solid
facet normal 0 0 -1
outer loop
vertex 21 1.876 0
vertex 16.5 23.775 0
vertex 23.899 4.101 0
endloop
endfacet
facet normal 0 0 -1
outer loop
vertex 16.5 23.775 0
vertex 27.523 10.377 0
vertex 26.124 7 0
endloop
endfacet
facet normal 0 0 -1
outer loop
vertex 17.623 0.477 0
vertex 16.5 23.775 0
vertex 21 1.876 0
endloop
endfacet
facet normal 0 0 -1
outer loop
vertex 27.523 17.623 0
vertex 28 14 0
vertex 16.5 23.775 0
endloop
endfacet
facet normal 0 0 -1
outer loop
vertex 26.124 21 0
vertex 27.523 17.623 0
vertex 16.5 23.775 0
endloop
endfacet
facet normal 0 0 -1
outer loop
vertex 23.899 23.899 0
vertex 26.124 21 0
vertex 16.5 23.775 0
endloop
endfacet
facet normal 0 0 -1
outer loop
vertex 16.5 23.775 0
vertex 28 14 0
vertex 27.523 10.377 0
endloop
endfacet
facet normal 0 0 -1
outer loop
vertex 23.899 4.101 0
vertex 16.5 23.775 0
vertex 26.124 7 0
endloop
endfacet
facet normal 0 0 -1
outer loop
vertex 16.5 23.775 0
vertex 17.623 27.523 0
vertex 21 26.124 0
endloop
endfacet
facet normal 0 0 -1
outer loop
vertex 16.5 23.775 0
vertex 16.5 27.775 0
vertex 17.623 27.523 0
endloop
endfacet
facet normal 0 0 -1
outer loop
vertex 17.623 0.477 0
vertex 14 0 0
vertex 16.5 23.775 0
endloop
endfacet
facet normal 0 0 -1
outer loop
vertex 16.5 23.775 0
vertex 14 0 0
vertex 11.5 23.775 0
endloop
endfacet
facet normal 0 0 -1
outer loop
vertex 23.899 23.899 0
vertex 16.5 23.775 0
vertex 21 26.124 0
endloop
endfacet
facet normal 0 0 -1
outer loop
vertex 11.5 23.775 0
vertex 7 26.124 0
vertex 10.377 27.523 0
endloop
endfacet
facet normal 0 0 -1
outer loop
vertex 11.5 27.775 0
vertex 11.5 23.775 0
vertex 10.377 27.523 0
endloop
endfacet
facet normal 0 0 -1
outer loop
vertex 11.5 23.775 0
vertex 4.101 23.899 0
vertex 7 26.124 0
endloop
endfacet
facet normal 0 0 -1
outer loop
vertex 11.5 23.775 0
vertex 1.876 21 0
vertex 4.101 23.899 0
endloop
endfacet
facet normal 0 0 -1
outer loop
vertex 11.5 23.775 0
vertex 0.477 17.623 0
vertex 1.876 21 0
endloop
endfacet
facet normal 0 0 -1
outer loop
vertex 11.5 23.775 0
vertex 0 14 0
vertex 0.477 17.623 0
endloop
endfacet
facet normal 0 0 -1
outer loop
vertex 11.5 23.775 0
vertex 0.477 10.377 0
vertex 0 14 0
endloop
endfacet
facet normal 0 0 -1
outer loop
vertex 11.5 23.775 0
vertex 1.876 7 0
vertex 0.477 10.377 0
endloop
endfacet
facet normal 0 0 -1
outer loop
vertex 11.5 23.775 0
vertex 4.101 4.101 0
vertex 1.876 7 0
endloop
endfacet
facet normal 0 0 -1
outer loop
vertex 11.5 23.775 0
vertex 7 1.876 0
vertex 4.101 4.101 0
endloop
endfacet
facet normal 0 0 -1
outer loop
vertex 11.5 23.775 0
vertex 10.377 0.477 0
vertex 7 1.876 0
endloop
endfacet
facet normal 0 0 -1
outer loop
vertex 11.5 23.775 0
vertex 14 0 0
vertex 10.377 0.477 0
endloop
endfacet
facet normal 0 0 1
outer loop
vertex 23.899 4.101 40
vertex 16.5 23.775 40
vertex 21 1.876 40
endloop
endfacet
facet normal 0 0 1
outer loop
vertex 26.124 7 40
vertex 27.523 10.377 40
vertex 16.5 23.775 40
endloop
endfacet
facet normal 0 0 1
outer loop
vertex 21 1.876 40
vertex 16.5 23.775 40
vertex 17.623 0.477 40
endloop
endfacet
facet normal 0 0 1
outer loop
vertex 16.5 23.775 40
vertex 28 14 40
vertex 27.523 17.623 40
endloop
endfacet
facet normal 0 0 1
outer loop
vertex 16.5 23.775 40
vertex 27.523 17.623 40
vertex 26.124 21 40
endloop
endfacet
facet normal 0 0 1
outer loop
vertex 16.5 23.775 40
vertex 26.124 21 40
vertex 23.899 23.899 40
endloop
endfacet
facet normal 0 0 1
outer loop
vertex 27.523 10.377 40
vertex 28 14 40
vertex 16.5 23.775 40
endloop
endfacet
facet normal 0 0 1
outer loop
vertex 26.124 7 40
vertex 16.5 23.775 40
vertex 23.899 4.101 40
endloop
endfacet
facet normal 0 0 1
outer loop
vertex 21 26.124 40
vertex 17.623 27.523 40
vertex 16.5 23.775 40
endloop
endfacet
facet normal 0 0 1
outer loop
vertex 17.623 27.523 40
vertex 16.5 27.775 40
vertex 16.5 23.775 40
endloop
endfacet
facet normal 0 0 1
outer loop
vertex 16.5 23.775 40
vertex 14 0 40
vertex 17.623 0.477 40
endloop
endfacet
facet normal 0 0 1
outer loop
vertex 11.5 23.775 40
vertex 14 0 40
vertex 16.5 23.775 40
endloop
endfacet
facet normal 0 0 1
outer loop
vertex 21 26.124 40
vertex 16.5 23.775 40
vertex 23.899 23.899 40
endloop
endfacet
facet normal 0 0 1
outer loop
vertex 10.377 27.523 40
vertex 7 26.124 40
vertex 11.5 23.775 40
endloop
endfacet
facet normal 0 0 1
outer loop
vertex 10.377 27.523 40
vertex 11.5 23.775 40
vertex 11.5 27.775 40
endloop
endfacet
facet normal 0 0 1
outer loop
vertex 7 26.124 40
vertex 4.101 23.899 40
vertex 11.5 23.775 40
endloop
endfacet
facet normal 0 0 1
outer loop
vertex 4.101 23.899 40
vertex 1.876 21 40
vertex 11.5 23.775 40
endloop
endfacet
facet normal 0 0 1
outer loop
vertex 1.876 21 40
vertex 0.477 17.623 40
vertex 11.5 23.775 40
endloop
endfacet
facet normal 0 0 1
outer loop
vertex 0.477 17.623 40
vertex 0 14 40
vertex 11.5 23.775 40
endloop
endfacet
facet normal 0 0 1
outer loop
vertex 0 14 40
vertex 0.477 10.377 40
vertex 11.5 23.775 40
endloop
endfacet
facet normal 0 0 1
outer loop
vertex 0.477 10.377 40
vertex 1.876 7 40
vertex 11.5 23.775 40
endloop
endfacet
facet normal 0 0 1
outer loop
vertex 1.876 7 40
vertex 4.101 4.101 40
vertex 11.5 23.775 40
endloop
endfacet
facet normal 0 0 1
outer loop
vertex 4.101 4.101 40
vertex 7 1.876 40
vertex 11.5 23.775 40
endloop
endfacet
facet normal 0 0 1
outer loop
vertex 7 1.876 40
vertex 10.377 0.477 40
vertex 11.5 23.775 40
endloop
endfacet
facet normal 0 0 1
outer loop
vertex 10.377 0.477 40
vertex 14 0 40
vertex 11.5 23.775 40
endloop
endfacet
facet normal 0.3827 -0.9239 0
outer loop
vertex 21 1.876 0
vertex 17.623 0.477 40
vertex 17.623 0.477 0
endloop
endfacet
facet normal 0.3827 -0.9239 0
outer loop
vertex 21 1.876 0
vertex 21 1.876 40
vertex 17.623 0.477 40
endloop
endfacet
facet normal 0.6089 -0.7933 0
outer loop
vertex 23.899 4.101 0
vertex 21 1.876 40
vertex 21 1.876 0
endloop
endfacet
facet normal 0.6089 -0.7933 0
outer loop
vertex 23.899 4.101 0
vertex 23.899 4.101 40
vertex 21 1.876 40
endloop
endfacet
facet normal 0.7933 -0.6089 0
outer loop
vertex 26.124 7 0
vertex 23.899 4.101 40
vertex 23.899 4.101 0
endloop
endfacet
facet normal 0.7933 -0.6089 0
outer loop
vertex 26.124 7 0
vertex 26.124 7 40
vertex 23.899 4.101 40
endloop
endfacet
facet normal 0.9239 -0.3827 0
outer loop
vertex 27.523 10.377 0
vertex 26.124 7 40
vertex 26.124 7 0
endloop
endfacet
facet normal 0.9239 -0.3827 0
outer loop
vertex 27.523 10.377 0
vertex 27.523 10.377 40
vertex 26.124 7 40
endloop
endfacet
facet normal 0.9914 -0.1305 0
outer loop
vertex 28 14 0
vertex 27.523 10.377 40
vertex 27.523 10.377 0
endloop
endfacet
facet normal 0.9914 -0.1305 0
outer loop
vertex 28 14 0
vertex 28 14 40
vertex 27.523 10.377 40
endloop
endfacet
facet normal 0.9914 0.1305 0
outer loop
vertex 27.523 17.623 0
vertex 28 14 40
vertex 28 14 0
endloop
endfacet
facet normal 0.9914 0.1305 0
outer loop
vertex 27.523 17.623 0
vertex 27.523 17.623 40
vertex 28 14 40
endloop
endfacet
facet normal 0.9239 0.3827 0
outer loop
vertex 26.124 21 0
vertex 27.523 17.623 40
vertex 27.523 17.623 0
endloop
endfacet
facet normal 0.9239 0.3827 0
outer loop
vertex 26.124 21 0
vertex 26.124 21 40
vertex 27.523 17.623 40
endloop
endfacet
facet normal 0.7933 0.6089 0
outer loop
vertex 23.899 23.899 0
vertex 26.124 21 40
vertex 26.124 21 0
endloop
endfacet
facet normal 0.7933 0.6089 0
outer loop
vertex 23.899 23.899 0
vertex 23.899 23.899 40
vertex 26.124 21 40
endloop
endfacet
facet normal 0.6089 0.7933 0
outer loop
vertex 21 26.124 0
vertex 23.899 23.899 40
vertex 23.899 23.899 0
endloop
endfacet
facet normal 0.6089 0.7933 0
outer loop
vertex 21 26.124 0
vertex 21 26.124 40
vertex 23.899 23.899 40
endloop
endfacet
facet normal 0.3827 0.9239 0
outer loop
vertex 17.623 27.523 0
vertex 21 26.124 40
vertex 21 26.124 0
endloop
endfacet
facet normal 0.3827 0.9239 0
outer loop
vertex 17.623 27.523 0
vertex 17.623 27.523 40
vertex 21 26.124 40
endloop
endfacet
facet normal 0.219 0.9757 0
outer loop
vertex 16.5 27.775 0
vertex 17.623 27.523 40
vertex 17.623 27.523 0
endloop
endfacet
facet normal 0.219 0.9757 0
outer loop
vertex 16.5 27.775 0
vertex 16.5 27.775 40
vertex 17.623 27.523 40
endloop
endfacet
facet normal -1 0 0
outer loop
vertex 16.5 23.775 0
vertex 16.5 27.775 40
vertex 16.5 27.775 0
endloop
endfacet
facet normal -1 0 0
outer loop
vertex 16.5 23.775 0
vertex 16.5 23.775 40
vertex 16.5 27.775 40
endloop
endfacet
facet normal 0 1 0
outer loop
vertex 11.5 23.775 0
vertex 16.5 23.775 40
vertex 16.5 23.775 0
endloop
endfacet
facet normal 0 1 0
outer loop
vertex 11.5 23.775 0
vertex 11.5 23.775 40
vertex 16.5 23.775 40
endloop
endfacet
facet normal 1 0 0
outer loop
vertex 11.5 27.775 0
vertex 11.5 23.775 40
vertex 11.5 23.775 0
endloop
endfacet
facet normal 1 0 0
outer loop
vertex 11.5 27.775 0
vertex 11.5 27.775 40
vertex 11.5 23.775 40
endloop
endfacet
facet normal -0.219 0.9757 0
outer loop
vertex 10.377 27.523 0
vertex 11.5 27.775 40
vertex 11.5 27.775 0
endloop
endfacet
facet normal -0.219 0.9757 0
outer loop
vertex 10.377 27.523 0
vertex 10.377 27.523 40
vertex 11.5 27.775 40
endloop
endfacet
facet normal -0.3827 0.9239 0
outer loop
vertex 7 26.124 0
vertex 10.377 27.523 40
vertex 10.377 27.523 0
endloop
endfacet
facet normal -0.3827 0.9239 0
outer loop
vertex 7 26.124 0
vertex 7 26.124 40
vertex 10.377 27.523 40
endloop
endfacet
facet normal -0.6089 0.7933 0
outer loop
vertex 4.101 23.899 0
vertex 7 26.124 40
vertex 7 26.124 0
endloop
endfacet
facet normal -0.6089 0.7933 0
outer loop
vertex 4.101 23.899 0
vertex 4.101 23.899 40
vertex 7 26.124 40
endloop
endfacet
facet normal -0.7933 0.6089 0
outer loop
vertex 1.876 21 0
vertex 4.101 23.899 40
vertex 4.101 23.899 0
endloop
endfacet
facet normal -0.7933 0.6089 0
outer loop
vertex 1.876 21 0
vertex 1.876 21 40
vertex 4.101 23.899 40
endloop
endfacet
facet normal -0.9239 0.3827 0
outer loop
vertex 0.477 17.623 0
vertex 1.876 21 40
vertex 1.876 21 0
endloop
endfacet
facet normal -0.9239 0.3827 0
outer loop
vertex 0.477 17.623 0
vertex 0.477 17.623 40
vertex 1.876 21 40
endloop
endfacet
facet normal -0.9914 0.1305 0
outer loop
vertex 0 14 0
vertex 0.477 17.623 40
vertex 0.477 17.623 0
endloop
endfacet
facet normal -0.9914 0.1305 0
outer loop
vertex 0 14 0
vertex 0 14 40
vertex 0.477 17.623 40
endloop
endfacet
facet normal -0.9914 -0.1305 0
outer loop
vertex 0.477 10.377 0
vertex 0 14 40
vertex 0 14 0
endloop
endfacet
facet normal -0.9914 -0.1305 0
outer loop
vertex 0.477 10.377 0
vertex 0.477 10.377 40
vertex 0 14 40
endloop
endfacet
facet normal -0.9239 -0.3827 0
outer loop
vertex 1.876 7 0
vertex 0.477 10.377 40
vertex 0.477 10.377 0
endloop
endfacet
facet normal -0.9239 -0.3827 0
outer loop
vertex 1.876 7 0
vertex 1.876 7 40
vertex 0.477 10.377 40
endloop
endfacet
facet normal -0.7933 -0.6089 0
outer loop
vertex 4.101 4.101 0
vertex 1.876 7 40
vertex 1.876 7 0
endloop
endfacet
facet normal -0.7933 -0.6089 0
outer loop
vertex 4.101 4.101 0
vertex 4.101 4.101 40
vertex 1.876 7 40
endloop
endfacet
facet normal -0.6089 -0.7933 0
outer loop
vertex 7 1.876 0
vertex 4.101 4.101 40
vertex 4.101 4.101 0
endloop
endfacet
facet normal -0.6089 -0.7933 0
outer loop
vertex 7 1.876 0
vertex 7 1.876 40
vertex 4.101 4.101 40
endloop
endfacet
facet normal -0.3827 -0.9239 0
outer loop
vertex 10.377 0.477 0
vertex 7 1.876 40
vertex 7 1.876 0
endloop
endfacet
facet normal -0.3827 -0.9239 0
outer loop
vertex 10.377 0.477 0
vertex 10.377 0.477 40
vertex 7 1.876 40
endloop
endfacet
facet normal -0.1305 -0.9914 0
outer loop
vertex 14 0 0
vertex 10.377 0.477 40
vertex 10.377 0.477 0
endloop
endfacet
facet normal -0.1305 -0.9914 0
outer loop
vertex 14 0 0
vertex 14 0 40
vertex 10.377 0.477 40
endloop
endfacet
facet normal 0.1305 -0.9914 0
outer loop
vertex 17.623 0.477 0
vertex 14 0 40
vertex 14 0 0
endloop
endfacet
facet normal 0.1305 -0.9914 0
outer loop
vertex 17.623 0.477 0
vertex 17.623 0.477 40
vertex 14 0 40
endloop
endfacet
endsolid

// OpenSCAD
$fn = 32;

// ----------------------------------------------------------------------
// Keyway shaft: d28 shaft, key 5 x 4 mm
// ----------------------------------------------------------------------

// --- parameters (mm) ---
shaft_r = 14;             // shaft radius
key_w = 5;                // keyway width
key_d = 4;                // keyway depth below the surface line
plate_t = 40;             // shaft length, Z (extrusion height)

shaft_d = 2 * shaft_r;  // shaft diameter
circle_step = 15;  // polygon sampling step, degrees

profile = [[10.377, 27.523], [7, 26.124], [4.101, 23.899], [1.876, 21], [0.477, 17.623], [0, 14], [0.477, 10.377], [1.876, 7], [4.101, 4.101], [7, 1.876], [10.377, 0.477], [14, 0], [17.623, 0.477], [21, 1.876], [23.899, 4.101], [26.124, 7], [27.523, 10.377], [28, 14], [27.523, 17.623], [26.124, 21], [23.899, 23.899], [21, 26.124], [17.623, 27.523], [16.5, 27.775], [16.5, 23.775], [11.5, 23.775], [11.5, 27.775]];  // primary outline, 27 points, counter clockwise

// --- the one profile operation ---
linear_extrude(height = plate_t) polygon(points = profile);
